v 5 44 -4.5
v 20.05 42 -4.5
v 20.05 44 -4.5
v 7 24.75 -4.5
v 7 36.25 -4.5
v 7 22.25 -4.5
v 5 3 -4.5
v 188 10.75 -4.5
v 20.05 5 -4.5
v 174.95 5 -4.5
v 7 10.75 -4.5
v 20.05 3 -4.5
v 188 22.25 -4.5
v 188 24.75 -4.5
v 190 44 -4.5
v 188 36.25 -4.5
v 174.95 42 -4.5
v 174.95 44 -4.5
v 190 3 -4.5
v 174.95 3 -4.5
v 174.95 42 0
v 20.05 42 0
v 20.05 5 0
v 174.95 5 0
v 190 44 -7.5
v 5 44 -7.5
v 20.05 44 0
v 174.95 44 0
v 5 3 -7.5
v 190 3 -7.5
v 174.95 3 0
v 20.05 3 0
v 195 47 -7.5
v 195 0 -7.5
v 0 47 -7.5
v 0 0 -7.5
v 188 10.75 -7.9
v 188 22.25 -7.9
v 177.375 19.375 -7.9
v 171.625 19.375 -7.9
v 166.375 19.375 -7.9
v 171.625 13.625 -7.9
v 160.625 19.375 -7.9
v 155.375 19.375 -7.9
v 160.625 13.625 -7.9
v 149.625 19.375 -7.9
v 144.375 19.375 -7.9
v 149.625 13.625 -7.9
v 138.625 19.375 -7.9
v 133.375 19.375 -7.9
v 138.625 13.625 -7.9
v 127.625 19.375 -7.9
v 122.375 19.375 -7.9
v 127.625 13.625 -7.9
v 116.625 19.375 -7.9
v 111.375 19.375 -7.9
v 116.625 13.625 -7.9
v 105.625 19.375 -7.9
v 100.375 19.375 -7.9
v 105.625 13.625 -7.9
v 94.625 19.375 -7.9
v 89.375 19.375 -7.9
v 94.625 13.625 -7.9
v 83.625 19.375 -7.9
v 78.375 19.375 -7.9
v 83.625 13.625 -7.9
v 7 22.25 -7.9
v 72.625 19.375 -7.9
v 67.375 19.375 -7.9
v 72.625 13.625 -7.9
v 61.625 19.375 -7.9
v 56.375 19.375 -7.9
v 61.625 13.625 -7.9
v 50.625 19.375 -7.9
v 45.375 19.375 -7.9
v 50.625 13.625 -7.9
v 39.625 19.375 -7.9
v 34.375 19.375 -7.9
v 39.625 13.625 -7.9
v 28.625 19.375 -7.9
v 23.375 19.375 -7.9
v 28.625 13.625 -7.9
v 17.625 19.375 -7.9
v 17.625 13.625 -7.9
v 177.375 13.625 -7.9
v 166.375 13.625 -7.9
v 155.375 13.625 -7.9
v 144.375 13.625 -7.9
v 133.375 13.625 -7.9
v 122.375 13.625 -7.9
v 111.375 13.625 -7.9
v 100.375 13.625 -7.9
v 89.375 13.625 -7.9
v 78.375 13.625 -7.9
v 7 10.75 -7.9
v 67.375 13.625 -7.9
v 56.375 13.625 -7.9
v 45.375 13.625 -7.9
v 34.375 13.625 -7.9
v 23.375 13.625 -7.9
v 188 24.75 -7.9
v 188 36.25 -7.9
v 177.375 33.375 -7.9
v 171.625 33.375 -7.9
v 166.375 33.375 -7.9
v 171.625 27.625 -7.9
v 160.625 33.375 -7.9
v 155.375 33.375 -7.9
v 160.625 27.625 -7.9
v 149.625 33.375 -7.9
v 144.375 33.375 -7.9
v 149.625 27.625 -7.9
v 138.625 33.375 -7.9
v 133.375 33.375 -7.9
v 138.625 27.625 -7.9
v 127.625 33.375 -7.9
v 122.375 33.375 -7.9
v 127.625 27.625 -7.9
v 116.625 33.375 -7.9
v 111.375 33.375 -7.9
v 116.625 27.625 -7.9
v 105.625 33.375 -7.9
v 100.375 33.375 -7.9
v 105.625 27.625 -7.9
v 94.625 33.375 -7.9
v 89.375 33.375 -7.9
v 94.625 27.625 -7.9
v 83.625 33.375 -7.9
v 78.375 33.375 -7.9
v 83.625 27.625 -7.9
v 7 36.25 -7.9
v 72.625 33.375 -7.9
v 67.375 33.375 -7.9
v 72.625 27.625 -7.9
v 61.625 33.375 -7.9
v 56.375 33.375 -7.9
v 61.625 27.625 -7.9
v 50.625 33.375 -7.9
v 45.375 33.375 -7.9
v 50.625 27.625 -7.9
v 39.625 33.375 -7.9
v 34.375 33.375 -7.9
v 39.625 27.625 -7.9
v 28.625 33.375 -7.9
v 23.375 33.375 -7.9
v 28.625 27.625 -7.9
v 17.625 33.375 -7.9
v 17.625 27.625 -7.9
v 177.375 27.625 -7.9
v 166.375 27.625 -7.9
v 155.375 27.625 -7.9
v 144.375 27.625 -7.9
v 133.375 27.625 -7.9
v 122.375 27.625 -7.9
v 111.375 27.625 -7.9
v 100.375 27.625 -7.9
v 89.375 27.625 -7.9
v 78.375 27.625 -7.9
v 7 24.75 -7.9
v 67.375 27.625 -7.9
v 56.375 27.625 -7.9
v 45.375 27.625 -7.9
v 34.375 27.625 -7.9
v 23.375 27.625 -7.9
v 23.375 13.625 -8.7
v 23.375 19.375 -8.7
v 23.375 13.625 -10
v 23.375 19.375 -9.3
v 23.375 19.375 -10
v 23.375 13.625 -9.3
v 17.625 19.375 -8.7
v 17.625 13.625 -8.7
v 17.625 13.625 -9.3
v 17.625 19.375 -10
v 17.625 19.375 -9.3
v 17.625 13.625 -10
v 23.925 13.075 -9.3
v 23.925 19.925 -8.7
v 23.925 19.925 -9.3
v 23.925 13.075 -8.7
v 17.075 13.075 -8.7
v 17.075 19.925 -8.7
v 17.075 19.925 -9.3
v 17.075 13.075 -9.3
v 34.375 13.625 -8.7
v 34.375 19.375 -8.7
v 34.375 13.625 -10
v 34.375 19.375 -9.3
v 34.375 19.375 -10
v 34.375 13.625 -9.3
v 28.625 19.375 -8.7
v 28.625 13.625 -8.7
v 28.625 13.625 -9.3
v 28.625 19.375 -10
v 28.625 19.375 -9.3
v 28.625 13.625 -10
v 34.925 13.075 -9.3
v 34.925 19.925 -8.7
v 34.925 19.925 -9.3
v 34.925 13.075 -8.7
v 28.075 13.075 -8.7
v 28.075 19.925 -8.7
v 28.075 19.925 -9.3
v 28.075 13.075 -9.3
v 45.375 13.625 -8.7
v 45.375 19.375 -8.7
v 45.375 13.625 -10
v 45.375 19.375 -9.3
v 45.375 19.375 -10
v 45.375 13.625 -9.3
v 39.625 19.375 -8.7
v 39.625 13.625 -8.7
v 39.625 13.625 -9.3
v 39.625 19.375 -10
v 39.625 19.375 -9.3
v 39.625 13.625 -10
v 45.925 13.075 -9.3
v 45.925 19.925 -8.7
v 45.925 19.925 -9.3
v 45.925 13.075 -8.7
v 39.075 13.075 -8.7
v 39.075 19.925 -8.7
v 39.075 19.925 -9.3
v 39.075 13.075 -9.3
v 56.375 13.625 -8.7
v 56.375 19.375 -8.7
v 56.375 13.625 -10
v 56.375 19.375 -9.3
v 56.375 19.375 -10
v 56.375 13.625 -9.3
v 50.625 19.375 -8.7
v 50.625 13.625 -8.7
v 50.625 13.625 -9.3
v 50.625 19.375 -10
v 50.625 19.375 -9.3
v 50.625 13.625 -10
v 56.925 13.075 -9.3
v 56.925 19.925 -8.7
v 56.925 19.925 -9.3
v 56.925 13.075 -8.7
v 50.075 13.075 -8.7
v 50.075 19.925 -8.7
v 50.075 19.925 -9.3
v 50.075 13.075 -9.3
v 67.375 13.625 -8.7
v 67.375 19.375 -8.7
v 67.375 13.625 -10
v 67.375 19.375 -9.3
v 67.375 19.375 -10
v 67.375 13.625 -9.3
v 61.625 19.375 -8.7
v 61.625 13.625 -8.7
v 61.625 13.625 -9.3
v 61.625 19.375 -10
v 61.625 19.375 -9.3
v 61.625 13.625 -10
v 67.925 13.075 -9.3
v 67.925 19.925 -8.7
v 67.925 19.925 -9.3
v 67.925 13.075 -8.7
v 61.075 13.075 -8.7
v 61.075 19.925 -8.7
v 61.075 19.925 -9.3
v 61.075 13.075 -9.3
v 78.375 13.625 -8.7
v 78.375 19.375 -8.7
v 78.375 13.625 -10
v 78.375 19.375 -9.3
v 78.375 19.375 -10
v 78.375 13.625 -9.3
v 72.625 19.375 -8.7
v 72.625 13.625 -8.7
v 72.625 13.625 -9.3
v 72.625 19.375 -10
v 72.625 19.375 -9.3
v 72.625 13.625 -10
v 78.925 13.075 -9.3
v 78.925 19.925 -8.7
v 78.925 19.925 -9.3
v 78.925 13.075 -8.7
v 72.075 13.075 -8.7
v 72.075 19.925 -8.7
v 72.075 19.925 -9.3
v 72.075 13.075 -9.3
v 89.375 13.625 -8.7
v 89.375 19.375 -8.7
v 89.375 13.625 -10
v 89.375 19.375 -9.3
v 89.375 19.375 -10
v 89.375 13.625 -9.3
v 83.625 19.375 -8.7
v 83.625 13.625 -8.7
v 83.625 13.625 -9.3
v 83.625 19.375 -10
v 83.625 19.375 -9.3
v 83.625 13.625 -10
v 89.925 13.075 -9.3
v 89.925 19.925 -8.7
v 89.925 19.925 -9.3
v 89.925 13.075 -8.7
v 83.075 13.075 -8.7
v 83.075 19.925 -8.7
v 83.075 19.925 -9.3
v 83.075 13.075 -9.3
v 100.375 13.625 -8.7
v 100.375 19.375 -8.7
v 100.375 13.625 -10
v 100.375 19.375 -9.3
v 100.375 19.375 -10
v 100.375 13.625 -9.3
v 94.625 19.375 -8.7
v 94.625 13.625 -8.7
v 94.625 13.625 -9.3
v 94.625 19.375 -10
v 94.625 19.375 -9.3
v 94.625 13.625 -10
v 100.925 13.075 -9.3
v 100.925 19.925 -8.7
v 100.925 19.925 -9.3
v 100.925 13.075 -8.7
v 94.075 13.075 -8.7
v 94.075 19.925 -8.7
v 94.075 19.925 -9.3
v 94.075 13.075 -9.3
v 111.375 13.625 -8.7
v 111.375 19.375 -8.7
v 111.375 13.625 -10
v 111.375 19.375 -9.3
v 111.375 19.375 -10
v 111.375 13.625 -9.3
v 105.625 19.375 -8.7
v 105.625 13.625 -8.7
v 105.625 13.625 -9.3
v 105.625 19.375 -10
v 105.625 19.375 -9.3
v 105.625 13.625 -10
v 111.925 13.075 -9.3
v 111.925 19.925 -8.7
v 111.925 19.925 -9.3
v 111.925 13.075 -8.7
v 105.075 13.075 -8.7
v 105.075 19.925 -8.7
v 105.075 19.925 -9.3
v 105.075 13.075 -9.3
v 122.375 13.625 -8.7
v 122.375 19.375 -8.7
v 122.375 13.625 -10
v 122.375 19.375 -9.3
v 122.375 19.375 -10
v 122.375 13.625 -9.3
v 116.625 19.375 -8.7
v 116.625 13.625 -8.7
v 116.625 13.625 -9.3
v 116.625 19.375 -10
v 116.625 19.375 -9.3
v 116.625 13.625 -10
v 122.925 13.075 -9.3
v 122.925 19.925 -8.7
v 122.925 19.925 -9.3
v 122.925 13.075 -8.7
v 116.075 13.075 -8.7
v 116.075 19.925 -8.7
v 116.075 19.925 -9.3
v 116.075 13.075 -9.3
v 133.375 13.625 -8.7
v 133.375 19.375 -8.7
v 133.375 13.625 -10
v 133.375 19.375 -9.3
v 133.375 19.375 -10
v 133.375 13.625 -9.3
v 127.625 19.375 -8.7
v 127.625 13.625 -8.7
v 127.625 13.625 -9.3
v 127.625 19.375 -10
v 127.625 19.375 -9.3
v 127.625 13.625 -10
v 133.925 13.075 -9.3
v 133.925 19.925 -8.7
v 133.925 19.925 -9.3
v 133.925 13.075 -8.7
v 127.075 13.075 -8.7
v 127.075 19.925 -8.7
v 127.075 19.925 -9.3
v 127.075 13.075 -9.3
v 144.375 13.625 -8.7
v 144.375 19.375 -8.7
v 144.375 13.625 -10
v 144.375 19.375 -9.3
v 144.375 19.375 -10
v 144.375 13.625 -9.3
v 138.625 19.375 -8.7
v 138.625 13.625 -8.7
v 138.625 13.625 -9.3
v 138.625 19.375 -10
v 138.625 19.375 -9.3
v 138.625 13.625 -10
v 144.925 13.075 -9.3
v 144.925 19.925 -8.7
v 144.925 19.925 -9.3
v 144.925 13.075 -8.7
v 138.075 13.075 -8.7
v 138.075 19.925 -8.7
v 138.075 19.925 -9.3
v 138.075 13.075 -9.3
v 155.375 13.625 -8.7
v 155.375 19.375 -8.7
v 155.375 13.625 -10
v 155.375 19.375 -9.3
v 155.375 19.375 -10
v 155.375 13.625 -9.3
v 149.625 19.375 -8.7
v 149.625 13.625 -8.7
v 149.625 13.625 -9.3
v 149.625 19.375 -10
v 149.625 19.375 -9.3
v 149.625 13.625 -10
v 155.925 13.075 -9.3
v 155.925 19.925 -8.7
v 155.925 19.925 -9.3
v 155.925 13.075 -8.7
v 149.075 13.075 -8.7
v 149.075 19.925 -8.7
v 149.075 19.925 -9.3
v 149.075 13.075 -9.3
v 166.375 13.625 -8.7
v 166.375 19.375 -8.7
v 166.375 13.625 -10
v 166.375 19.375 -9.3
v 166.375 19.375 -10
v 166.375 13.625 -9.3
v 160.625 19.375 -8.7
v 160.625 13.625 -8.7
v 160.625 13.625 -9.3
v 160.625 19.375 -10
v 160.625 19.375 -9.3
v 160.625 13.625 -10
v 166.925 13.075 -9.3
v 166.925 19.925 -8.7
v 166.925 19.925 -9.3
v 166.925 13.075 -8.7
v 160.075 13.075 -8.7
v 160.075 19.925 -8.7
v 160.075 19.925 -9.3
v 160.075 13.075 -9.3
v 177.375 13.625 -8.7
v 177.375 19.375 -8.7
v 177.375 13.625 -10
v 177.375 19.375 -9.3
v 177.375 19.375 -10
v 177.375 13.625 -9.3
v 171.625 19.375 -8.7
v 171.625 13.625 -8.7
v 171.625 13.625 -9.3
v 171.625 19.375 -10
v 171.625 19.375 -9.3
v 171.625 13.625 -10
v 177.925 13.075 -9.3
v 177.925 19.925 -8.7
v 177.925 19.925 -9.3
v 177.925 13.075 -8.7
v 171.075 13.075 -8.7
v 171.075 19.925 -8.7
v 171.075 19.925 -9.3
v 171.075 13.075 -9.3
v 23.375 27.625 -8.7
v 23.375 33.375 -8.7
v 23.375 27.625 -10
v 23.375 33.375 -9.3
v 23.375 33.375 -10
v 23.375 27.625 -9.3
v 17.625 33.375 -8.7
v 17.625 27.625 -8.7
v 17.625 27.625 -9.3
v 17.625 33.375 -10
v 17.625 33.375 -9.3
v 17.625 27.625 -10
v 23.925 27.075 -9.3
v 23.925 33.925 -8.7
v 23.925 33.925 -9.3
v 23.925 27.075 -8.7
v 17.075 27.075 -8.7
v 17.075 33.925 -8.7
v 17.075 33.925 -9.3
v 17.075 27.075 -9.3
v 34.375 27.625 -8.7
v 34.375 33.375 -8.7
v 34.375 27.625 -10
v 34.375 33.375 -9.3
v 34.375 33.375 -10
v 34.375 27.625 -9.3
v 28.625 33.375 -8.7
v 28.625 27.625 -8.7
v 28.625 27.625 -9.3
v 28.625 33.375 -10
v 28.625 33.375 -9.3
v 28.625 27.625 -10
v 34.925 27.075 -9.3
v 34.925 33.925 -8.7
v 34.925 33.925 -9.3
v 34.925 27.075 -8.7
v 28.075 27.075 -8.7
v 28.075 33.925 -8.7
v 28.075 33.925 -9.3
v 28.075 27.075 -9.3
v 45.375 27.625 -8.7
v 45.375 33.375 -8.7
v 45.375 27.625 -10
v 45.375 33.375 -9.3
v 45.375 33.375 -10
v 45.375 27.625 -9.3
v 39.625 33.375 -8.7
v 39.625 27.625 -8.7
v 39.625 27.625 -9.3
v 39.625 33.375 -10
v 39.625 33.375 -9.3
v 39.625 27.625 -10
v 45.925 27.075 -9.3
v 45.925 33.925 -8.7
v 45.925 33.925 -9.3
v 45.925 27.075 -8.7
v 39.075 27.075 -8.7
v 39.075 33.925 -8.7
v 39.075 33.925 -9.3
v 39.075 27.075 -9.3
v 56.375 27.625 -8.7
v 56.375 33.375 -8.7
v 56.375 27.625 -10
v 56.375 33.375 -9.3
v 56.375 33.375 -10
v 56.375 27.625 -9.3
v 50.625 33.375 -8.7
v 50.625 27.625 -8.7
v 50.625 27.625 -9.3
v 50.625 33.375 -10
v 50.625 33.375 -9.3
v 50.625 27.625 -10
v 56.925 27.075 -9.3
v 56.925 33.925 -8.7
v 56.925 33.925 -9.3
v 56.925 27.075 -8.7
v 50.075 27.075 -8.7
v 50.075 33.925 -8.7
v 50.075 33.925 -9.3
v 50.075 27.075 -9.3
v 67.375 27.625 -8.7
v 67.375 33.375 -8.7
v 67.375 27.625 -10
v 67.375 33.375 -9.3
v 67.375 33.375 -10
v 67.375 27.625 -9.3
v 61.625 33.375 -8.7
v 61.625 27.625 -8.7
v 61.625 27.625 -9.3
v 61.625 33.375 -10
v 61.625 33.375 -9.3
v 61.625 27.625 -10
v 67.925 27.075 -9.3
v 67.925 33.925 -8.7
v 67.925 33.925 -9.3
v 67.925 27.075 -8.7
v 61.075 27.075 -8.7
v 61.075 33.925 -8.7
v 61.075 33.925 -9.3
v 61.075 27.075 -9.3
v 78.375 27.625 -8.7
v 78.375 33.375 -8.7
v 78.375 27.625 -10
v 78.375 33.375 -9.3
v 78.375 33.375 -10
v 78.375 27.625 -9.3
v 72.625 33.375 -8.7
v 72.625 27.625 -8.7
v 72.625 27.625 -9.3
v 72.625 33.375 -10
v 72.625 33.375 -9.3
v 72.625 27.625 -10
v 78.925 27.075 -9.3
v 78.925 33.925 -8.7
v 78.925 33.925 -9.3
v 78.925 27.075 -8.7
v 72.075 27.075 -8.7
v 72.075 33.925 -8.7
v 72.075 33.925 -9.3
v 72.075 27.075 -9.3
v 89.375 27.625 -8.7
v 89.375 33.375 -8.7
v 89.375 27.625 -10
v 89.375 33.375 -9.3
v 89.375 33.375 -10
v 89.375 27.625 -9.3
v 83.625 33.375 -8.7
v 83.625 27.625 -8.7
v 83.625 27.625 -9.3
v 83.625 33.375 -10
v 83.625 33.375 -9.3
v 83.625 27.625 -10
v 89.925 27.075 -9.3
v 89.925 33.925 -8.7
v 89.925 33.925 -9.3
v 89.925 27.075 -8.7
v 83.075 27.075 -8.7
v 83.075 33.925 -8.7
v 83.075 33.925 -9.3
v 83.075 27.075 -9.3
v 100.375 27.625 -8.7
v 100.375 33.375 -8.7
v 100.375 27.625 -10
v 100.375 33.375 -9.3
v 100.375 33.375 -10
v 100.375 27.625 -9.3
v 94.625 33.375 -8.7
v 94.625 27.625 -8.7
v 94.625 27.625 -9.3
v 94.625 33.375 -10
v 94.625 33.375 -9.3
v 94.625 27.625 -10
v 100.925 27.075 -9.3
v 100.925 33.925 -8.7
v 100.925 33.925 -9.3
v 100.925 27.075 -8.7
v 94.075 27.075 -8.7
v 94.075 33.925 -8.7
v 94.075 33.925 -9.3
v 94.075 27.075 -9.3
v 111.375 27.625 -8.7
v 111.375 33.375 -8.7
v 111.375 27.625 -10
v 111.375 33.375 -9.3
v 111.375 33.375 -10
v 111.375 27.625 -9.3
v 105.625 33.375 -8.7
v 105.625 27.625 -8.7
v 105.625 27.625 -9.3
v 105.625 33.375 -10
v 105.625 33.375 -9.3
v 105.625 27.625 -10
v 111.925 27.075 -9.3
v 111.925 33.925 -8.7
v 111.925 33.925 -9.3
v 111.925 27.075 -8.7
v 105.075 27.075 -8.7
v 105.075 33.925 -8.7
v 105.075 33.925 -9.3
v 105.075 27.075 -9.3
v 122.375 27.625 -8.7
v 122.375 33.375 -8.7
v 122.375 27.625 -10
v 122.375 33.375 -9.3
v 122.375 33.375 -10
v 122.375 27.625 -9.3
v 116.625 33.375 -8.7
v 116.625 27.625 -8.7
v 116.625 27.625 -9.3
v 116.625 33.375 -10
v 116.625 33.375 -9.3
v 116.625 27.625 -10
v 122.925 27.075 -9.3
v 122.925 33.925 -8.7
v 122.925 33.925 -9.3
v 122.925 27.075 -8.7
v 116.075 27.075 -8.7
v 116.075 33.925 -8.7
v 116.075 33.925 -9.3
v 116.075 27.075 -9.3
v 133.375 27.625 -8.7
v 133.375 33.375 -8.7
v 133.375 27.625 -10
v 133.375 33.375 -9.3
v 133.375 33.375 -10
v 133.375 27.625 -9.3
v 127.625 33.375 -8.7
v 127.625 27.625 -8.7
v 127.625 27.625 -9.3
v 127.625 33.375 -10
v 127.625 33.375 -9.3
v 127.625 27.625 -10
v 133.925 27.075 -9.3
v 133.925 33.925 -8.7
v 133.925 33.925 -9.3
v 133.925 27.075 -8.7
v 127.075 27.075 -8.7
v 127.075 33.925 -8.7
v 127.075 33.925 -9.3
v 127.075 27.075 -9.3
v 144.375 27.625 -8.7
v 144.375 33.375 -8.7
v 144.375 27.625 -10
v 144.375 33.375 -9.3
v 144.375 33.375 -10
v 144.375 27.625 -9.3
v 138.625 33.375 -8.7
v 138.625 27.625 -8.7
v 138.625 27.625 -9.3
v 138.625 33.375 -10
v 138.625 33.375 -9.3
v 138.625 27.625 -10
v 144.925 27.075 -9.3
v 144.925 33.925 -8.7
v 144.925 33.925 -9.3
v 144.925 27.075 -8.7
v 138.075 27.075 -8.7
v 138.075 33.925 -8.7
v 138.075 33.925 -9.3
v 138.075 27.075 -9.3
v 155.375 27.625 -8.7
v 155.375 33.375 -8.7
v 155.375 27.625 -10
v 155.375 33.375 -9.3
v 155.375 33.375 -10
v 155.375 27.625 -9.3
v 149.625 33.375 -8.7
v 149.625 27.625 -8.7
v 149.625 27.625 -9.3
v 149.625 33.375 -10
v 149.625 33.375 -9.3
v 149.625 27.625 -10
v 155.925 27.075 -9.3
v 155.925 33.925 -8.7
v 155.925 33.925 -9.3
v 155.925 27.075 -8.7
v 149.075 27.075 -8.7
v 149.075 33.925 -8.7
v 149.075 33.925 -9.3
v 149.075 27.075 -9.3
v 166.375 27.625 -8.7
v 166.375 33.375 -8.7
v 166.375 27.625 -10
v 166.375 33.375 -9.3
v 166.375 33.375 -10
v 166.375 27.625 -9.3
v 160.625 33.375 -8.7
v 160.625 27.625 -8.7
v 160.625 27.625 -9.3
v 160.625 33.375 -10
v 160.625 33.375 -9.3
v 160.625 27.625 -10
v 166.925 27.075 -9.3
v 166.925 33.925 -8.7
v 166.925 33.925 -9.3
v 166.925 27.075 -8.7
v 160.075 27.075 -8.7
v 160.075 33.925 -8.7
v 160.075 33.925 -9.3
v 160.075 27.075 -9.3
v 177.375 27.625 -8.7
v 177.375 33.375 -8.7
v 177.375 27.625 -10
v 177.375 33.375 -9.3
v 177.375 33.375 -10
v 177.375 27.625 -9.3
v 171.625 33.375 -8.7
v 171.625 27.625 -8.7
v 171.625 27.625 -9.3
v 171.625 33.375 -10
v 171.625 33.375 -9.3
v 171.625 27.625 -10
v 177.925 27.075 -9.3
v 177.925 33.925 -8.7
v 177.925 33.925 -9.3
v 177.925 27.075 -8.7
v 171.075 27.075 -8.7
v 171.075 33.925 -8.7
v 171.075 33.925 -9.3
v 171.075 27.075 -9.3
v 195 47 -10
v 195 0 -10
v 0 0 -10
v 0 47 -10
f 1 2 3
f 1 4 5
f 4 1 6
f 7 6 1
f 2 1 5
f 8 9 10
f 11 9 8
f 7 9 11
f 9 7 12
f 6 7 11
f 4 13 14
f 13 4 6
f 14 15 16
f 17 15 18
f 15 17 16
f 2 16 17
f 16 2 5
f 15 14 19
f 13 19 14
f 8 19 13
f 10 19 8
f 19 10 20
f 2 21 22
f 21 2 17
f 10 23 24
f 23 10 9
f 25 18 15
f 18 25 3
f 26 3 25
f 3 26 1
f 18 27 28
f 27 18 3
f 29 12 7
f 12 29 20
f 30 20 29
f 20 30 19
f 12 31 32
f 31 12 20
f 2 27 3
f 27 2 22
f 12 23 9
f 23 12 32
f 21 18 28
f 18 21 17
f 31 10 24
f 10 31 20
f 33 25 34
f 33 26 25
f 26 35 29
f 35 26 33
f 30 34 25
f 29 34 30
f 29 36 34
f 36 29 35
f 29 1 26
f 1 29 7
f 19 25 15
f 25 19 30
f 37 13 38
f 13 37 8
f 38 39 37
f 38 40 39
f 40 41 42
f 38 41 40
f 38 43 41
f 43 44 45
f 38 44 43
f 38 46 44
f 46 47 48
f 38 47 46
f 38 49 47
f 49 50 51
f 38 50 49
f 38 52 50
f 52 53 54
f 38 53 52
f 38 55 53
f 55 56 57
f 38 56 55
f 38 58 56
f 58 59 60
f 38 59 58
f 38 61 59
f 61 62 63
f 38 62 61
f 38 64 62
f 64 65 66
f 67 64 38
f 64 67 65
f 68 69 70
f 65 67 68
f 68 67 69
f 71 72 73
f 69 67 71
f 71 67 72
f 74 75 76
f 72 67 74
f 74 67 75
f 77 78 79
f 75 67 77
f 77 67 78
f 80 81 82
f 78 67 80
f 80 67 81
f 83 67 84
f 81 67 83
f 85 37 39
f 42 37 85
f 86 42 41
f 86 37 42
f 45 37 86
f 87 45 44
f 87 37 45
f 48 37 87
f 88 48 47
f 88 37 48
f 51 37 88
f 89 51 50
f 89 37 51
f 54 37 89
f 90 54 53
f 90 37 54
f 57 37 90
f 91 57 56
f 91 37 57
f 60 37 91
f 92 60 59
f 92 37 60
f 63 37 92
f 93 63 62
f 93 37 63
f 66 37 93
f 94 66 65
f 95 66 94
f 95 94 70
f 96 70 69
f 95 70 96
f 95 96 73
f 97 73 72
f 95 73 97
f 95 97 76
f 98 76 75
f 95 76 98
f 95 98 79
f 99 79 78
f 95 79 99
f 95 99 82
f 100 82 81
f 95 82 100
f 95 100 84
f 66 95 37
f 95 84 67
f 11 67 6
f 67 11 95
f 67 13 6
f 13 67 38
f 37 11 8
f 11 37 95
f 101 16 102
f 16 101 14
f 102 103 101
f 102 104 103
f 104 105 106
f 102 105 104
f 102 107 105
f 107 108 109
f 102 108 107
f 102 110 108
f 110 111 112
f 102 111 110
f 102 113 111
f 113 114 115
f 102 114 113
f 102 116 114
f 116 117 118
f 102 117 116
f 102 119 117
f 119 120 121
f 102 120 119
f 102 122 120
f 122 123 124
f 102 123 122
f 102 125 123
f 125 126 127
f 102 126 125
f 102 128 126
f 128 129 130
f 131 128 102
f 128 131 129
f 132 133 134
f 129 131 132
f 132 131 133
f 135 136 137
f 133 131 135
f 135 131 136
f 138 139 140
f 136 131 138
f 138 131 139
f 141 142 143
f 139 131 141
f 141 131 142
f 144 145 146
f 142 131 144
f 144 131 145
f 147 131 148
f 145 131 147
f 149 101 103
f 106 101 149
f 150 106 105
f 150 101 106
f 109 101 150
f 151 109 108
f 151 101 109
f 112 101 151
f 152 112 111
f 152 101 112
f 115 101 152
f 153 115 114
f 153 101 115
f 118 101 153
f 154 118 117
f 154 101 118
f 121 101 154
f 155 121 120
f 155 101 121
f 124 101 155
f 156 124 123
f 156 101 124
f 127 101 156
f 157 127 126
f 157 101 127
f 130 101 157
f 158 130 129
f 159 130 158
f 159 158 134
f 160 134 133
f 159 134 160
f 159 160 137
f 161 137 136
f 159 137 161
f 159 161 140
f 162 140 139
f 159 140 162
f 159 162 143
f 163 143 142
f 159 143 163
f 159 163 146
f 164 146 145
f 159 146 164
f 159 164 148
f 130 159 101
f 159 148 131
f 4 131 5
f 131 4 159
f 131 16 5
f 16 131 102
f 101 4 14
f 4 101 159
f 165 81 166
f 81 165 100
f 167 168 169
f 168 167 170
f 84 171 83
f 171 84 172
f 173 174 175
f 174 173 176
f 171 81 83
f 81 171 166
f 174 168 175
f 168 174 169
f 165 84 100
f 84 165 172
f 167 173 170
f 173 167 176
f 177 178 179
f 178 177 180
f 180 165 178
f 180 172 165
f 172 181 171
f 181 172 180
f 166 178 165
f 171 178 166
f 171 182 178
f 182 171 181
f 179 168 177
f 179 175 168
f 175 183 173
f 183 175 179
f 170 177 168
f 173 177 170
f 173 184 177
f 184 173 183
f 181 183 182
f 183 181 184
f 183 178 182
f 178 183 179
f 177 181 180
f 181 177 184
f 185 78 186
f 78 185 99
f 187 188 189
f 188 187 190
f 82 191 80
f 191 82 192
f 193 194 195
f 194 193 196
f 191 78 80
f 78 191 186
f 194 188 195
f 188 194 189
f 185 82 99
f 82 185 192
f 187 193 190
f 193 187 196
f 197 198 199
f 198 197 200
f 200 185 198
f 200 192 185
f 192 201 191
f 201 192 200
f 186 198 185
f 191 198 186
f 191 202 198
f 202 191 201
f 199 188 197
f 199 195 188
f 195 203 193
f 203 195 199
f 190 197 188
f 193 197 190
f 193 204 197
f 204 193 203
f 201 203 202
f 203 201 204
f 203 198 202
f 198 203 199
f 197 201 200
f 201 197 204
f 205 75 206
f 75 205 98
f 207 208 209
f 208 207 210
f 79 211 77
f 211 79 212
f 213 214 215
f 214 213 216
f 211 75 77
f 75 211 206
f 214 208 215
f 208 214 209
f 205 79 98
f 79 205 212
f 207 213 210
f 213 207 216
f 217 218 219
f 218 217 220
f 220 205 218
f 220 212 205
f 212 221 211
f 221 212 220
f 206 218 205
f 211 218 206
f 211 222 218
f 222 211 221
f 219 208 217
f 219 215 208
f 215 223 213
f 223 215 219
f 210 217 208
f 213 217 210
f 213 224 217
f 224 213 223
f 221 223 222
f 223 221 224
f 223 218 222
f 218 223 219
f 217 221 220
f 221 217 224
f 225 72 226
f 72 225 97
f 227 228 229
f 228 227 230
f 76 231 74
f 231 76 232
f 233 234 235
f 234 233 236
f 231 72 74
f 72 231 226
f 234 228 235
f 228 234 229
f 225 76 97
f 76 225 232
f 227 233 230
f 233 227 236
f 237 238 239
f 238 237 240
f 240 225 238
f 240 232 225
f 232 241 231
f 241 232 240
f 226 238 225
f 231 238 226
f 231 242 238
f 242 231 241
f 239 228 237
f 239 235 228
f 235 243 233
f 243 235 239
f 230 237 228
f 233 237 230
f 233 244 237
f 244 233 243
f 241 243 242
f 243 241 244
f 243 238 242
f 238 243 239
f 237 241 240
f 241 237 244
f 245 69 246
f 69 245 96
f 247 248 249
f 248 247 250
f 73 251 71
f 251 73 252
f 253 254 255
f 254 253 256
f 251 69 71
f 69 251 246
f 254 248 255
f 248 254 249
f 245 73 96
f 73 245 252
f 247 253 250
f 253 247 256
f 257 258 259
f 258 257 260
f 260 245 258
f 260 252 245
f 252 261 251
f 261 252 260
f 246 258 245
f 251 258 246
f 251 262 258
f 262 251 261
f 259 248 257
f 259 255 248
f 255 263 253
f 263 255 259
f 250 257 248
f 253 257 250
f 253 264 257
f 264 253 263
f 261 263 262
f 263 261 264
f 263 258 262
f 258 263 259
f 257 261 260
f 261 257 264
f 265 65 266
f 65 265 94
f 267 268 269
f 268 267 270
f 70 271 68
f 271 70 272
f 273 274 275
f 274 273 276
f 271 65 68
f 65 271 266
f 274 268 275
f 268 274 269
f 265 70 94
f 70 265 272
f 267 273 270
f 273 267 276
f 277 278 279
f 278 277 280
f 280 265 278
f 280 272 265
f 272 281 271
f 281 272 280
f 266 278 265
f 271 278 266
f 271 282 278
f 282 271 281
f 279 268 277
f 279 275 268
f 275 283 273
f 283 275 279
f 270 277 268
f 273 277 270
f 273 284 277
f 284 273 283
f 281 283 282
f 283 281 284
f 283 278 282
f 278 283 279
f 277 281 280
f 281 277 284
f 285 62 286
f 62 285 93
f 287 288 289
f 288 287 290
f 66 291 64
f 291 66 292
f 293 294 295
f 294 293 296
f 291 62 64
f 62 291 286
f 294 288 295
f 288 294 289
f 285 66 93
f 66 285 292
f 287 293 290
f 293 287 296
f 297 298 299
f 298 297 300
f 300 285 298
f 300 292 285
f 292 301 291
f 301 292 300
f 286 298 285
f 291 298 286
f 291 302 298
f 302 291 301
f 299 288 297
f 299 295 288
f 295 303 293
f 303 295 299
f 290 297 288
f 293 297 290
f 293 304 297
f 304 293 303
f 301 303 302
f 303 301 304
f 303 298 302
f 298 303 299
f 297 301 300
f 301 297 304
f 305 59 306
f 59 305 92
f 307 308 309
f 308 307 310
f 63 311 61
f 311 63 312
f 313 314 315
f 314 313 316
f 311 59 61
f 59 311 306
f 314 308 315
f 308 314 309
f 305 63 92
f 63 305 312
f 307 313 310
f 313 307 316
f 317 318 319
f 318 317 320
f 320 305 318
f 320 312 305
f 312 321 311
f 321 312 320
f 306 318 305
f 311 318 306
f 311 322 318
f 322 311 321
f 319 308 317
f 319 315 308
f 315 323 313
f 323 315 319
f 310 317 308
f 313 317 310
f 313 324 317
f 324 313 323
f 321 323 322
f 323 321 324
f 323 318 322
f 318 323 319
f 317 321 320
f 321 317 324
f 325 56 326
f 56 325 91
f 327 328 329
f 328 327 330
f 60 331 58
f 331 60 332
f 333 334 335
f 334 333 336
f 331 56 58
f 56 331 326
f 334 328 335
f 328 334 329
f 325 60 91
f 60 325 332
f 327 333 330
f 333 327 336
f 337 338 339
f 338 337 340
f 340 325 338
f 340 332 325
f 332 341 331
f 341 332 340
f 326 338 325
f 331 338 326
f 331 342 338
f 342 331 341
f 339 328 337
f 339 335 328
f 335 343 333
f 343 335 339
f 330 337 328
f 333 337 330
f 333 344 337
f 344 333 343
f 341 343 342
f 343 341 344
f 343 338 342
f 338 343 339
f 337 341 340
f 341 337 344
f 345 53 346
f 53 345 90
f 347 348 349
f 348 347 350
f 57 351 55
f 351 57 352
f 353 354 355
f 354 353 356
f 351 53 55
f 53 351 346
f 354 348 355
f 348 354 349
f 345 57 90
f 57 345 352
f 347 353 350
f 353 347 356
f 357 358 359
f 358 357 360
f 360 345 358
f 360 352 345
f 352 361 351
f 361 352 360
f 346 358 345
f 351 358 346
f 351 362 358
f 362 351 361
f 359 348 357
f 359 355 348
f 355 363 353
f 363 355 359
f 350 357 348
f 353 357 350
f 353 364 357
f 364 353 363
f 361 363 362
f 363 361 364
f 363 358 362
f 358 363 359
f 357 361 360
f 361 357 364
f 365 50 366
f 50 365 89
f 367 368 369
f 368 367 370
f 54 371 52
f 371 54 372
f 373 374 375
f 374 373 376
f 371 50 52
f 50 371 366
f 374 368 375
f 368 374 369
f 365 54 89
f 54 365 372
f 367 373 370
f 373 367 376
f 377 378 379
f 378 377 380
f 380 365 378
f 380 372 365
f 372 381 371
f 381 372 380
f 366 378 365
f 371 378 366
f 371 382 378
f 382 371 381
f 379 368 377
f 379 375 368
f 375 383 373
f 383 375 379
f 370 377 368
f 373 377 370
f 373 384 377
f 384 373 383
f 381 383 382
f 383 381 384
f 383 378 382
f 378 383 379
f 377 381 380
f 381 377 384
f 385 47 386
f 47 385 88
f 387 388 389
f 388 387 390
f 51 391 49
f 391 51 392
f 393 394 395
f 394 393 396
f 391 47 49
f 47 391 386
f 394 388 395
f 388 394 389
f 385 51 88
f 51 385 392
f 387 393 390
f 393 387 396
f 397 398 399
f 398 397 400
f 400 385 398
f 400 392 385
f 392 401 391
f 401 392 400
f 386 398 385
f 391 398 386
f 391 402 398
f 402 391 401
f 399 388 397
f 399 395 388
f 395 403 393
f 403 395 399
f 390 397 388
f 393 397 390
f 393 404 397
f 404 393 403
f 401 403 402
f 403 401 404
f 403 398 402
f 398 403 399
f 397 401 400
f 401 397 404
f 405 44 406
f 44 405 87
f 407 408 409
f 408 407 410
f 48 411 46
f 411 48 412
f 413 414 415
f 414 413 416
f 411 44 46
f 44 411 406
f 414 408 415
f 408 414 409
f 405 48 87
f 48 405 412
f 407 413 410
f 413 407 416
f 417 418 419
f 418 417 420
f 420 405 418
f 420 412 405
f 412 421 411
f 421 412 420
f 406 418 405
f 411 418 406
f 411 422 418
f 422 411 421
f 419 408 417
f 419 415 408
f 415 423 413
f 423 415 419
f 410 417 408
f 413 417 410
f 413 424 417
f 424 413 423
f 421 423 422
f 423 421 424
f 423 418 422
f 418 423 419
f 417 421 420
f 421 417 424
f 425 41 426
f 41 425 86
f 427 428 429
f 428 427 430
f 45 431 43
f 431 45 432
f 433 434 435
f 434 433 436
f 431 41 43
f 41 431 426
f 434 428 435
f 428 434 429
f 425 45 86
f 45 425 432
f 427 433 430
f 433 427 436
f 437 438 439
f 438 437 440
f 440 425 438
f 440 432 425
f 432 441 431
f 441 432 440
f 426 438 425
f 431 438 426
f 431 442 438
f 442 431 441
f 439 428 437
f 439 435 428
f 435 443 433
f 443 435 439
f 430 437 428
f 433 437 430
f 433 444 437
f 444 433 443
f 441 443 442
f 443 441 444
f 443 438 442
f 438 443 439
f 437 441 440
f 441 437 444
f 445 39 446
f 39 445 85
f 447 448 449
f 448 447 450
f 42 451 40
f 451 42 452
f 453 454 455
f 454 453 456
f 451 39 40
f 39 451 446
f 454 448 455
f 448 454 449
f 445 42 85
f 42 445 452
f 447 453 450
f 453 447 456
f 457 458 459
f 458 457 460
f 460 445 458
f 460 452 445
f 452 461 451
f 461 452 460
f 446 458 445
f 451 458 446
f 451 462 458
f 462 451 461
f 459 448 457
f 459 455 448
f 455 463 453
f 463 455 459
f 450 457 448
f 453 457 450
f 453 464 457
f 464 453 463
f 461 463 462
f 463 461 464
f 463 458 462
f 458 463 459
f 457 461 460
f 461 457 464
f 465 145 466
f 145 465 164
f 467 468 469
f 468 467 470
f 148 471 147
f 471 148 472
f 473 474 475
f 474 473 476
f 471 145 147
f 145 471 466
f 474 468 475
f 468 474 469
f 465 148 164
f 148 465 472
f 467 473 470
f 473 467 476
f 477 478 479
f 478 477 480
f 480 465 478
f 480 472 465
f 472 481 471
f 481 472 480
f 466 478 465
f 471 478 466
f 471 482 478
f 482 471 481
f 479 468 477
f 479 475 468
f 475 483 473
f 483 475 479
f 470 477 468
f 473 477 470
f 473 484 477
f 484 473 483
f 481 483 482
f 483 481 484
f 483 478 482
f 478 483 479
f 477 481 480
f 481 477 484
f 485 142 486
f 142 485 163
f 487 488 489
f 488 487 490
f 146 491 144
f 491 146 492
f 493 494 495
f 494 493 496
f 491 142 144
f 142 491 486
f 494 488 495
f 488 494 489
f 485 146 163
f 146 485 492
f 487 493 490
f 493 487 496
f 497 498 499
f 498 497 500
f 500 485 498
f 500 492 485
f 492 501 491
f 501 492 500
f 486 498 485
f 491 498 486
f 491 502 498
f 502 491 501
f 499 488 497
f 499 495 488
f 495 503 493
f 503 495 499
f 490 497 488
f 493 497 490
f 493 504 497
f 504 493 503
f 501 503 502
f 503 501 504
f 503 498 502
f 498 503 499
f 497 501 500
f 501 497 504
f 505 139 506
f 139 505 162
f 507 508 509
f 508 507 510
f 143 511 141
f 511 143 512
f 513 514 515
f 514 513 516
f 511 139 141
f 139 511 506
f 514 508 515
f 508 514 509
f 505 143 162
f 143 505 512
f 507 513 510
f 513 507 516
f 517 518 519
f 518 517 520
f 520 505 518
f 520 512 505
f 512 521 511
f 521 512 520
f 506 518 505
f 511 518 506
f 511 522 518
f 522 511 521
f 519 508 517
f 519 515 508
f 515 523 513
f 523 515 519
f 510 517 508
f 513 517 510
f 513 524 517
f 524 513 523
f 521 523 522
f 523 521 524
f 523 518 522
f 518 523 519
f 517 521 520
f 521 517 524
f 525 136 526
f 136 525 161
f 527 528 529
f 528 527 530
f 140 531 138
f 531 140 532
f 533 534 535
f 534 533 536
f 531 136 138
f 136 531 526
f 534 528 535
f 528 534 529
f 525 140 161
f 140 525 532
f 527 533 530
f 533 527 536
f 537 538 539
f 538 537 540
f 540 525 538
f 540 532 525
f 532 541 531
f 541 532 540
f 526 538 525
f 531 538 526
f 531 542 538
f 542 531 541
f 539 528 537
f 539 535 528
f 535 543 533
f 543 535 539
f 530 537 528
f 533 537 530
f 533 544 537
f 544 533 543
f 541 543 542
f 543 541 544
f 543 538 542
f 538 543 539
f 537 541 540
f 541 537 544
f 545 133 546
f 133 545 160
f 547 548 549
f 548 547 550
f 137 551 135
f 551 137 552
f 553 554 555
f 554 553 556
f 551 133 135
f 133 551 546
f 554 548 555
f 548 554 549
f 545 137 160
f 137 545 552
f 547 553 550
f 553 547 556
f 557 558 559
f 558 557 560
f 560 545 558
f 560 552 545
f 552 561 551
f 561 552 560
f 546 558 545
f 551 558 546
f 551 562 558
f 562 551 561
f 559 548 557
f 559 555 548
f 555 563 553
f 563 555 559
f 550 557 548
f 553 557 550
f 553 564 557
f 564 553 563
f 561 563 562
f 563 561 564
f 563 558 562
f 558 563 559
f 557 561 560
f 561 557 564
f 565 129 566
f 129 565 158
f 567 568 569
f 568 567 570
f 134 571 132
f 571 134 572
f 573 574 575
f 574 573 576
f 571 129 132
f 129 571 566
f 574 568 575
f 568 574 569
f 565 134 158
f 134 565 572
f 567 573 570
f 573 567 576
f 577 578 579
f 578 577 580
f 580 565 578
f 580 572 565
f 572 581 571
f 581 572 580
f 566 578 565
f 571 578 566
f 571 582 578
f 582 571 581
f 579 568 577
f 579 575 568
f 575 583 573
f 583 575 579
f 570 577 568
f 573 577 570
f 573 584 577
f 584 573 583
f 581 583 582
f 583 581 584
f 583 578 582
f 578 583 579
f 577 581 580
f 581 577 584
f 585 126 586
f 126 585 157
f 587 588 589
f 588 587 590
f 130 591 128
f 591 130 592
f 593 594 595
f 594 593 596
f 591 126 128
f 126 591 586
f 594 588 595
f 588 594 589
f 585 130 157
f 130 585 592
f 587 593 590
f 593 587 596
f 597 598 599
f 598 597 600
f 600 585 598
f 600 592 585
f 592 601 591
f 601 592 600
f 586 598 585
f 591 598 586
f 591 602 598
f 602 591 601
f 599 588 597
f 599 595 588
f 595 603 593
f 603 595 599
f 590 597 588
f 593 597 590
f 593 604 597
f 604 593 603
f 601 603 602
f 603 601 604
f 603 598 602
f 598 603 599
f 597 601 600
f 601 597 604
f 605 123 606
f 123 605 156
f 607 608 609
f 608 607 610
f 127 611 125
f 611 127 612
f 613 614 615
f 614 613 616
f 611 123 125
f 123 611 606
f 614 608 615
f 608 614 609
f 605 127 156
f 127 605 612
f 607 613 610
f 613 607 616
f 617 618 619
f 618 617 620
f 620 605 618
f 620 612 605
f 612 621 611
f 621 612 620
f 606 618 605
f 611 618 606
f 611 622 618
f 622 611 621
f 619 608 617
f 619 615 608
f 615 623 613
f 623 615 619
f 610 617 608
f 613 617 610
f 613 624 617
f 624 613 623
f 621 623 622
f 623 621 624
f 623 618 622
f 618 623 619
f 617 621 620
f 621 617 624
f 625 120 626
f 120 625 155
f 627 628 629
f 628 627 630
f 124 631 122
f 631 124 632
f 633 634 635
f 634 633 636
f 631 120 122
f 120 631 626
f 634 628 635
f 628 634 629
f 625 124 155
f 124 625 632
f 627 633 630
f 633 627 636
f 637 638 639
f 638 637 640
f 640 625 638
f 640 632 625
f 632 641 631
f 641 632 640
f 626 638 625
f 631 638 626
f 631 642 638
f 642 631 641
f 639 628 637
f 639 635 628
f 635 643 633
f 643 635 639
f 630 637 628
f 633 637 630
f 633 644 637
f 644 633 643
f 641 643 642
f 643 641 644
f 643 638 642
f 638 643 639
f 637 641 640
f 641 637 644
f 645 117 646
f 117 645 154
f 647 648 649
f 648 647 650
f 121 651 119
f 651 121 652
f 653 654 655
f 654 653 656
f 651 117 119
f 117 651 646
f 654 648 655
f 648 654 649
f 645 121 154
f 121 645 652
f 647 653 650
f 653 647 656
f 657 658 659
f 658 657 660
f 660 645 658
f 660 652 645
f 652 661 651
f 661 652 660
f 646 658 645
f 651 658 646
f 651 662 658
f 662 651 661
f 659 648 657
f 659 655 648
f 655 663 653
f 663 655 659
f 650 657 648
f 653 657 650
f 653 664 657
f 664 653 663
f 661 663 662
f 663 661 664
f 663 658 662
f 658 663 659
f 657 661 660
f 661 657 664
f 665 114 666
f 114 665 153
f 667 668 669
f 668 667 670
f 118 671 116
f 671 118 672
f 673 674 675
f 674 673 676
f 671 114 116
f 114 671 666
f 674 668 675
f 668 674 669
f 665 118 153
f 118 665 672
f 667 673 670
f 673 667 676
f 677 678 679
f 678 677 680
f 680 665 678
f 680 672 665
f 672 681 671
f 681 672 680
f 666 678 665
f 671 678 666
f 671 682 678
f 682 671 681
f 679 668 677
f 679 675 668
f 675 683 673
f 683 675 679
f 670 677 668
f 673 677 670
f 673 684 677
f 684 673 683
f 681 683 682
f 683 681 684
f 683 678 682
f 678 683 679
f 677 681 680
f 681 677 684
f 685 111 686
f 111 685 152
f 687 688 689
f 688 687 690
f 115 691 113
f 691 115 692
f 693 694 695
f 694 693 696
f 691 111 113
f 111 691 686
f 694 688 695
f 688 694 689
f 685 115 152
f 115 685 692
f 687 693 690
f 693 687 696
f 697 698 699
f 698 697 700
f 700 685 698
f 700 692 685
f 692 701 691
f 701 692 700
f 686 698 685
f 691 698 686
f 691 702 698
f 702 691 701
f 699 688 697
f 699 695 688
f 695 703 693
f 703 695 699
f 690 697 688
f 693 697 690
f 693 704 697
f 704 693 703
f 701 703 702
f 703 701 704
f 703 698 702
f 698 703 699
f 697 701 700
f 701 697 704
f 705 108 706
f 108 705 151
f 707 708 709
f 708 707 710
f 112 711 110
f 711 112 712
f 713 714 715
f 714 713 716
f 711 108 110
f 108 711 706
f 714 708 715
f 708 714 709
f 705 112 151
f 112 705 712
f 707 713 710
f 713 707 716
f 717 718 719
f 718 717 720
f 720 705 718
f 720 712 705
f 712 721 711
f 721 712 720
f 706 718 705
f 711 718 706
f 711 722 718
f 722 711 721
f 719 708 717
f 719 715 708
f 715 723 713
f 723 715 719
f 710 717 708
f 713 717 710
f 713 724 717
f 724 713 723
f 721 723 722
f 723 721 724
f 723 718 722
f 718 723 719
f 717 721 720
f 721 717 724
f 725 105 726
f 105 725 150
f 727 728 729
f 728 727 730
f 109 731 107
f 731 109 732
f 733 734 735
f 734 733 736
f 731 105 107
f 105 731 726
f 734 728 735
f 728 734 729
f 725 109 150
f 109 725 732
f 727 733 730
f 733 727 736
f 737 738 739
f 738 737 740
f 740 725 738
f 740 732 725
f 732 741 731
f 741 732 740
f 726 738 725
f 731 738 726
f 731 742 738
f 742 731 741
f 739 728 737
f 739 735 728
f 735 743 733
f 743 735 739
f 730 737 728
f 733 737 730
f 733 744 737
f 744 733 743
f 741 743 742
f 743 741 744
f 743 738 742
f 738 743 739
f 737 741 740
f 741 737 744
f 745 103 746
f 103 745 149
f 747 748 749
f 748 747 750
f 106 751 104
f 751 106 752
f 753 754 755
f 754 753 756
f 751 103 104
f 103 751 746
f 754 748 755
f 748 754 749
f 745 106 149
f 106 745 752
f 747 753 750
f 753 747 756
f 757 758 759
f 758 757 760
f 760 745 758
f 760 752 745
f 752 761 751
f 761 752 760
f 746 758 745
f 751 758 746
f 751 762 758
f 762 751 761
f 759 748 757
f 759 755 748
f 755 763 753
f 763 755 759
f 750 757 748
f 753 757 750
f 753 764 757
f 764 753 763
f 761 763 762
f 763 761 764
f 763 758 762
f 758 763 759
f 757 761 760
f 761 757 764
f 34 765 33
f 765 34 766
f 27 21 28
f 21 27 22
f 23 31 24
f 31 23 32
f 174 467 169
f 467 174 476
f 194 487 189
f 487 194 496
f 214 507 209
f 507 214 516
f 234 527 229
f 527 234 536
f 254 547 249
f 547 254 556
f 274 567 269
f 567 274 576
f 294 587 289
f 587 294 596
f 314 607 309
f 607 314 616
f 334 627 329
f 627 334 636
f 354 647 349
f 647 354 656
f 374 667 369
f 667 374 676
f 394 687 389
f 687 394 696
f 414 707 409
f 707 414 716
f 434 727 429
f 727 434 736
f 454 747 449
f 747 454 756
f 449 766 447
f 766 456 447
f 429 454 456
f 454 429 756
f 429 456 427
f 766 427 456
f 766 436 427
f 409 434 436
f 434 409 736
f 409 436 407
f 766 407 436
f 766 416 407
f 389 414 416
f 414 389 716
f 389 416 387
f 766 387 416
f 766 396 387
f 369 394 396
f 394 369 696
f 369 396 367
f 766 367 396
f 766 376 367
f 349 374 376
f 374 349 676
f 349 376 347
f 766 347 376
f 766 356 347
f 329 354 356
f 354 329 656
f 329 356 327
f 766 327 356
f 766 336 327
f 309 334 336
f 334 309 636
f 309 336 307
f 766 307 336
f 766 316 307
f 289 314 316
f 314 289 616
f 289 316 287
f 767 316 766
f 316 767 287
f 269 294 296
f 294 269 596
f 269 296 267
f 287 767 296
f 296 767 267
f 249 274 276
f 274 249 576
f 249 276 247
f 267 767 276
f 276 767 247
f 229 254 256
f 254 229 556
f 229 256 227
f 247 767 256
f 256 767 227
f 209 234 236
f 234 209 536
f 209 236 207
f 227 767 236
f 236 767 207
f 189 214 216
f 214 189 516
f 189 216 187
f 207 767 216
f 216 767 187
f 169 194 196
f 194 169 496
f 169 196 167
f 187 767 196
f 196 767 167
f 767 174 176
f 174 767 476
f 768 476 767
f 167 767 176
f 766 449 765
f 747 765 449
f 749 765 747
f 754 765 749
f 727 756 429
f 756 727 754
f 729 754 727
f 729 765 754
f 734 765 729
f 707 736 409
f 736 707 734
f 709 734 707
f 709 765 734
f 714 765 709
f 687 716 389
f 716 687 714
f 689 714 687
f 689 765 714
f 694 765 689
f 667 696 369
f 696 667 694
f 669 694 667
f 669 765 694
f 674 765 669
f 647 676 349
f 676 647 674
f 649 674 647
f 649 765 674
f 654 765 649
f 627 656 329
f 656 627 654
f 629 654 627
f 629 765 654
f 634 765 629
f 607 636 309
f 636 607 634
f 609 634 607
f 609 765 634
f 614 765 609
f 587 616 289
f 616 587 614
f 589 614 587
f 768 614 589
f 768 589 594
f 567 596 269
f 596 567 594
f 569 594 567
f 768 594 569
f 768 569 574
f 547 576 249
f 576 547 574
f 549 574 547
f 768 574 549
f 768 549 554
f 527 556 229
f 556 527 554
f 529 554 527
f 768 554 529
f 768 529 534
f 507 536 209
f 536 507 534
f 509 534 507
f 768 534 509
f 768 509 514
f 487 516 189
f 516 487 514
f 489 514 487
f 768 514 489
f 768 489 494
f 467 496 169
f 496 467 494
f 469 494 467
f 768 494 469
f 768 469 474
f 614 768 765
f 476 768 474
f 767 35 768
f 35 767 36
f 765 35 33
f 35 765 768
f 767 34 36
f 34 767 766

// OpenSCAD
// file: Diffusor_v1.scad
include <Defines_v1.scad>;

module LED() {
    union() {
        cube([led, led, 2], center = true);
        cube([led+1, led+1, 0.5], center = true);
    }
}

module Diffusor() {
    translate([margin, 0, -thick + 1.1]) {        
            for (a = [ 0 : 1 : 14 ])
                translate([(a + 0.5) * (5 + space) + 5, height / 2 - 7, 0]) 
                    LED();
                    
            for (a = [ 0 : 1 : 14 ])
                translate([(a + 0.5) * (5 + space) + 5, height / 2 + 7, 0]) 
                    LED();
        }        
}

Diffusor();
// file: Defines_v1.scad
/* spacing between the leds
 * usually around 12, can be forced
 * to 6-10 by bending strip
 */
space = 6;  

/* some space for the outermost leds
 * for better viewing angle
 */
margin = 10;

/* 15 leds (type 5050) with above spacing */
width = 15 * (5 + space) + 10 + 2 * margin;

/* box height, min. 42mm */
height = 47;

/* box depth, min 100mm for 4x3-keypad */
depth = 105;

/* max wall thickness */
thick=10;

/* grade of feet smoothness
 * below 10 looks bad
 * 10-16 is reasonable
 * above 16 takes much time to render
 */
grade = 12;

/* length of side stands 
 * should be enough to get box in right angle
 * should not exceed back of box
 */
stand = min(height + 20, depth - 40);

/* offset of usb plug from center */
usb_offs = 60;

/* calculated values */
bwidth = width + 14;
bheight = depth + 7;

/* size of led holes 
 * includes some margin for 5050 leds
 */
led = 5.75;

minimal = 1;
// main file
include <Defines_v1.scad>;
use <Diffusor_v1.scad>;

module LED_hole() {
    union() {
        cube([led, led, 5], center = true);
        cube([led+1.1, led+1.1, 0.6], center = true);
    }
}

module Blende() {
    difference() {
        translate([width / 2, height / 2, -thick / 2]) 
            cube([width, height, thick], center = true);
        
        translate([0, 0, 0]) {
            translate([width / 2, height / 2, 0]) 
                cube([width + 0.1, height - 10, thick - 1], center = true);
            translate([width / 2, height, 0]) 
                cube([width + 0.1, 6, thick - 1], center = true);
            translate([width / 2, 0, 0]) 
                cube([width + 0.1, 6, thick - 1], center = true);
            translate([10, height / 2, 0]) 
                cube([20.1, height + 0.1, thick - 1], center = true);
            translate([width - 10, height / 2, 0]) 
                cube([20.1, height + 0.1, thick - 1], center = true);
        }
        
        translate([0, 0, -3]) {
            translate([width / 2, height, 0]) 
                cube([width + 0.1, 6, thick - 1], center = true);
            translate([width / 2, 0, 0]) 
                cube([width + 0.1, 6, thick - 1], center = true);
            translate([2, height / 2, 0]) 
                cube([6, height + 0.1, thick - 1], center = true);
            translate([width - 2, height / 2, 0]) 
                cube([6, height + 0.1, thick - 1], center = true);
        }        
        
        translate([0, 0, -thick / 2 + 1.6]) {
            translate([width / 2, height / 2 - 7, 0]) 
                cube([width - margin - 4, 11.5, thick - 1], center = true);
            translate([width/2, height / 2 + 7, 0]) 
                cube([width - margin - 4, 11.5, thick - 1], center = true);
        }
        
        translate([margin, 0, -9.0]) {        
            for (a = [ 0 : 1 : 14 ])
                translate([(a + 0.5) * (5 + space) + 5, height / 2 - 7, 0]) 
                    LED_hole();
            for (a = [ 0 : 1 : 14 ])
                translate([(a + 0.5) * (5 + space) + 5, height / 2 + 7, 0]) 
                    LED_hole();
        }   
    }
}

%Diffusor();
Blende();
